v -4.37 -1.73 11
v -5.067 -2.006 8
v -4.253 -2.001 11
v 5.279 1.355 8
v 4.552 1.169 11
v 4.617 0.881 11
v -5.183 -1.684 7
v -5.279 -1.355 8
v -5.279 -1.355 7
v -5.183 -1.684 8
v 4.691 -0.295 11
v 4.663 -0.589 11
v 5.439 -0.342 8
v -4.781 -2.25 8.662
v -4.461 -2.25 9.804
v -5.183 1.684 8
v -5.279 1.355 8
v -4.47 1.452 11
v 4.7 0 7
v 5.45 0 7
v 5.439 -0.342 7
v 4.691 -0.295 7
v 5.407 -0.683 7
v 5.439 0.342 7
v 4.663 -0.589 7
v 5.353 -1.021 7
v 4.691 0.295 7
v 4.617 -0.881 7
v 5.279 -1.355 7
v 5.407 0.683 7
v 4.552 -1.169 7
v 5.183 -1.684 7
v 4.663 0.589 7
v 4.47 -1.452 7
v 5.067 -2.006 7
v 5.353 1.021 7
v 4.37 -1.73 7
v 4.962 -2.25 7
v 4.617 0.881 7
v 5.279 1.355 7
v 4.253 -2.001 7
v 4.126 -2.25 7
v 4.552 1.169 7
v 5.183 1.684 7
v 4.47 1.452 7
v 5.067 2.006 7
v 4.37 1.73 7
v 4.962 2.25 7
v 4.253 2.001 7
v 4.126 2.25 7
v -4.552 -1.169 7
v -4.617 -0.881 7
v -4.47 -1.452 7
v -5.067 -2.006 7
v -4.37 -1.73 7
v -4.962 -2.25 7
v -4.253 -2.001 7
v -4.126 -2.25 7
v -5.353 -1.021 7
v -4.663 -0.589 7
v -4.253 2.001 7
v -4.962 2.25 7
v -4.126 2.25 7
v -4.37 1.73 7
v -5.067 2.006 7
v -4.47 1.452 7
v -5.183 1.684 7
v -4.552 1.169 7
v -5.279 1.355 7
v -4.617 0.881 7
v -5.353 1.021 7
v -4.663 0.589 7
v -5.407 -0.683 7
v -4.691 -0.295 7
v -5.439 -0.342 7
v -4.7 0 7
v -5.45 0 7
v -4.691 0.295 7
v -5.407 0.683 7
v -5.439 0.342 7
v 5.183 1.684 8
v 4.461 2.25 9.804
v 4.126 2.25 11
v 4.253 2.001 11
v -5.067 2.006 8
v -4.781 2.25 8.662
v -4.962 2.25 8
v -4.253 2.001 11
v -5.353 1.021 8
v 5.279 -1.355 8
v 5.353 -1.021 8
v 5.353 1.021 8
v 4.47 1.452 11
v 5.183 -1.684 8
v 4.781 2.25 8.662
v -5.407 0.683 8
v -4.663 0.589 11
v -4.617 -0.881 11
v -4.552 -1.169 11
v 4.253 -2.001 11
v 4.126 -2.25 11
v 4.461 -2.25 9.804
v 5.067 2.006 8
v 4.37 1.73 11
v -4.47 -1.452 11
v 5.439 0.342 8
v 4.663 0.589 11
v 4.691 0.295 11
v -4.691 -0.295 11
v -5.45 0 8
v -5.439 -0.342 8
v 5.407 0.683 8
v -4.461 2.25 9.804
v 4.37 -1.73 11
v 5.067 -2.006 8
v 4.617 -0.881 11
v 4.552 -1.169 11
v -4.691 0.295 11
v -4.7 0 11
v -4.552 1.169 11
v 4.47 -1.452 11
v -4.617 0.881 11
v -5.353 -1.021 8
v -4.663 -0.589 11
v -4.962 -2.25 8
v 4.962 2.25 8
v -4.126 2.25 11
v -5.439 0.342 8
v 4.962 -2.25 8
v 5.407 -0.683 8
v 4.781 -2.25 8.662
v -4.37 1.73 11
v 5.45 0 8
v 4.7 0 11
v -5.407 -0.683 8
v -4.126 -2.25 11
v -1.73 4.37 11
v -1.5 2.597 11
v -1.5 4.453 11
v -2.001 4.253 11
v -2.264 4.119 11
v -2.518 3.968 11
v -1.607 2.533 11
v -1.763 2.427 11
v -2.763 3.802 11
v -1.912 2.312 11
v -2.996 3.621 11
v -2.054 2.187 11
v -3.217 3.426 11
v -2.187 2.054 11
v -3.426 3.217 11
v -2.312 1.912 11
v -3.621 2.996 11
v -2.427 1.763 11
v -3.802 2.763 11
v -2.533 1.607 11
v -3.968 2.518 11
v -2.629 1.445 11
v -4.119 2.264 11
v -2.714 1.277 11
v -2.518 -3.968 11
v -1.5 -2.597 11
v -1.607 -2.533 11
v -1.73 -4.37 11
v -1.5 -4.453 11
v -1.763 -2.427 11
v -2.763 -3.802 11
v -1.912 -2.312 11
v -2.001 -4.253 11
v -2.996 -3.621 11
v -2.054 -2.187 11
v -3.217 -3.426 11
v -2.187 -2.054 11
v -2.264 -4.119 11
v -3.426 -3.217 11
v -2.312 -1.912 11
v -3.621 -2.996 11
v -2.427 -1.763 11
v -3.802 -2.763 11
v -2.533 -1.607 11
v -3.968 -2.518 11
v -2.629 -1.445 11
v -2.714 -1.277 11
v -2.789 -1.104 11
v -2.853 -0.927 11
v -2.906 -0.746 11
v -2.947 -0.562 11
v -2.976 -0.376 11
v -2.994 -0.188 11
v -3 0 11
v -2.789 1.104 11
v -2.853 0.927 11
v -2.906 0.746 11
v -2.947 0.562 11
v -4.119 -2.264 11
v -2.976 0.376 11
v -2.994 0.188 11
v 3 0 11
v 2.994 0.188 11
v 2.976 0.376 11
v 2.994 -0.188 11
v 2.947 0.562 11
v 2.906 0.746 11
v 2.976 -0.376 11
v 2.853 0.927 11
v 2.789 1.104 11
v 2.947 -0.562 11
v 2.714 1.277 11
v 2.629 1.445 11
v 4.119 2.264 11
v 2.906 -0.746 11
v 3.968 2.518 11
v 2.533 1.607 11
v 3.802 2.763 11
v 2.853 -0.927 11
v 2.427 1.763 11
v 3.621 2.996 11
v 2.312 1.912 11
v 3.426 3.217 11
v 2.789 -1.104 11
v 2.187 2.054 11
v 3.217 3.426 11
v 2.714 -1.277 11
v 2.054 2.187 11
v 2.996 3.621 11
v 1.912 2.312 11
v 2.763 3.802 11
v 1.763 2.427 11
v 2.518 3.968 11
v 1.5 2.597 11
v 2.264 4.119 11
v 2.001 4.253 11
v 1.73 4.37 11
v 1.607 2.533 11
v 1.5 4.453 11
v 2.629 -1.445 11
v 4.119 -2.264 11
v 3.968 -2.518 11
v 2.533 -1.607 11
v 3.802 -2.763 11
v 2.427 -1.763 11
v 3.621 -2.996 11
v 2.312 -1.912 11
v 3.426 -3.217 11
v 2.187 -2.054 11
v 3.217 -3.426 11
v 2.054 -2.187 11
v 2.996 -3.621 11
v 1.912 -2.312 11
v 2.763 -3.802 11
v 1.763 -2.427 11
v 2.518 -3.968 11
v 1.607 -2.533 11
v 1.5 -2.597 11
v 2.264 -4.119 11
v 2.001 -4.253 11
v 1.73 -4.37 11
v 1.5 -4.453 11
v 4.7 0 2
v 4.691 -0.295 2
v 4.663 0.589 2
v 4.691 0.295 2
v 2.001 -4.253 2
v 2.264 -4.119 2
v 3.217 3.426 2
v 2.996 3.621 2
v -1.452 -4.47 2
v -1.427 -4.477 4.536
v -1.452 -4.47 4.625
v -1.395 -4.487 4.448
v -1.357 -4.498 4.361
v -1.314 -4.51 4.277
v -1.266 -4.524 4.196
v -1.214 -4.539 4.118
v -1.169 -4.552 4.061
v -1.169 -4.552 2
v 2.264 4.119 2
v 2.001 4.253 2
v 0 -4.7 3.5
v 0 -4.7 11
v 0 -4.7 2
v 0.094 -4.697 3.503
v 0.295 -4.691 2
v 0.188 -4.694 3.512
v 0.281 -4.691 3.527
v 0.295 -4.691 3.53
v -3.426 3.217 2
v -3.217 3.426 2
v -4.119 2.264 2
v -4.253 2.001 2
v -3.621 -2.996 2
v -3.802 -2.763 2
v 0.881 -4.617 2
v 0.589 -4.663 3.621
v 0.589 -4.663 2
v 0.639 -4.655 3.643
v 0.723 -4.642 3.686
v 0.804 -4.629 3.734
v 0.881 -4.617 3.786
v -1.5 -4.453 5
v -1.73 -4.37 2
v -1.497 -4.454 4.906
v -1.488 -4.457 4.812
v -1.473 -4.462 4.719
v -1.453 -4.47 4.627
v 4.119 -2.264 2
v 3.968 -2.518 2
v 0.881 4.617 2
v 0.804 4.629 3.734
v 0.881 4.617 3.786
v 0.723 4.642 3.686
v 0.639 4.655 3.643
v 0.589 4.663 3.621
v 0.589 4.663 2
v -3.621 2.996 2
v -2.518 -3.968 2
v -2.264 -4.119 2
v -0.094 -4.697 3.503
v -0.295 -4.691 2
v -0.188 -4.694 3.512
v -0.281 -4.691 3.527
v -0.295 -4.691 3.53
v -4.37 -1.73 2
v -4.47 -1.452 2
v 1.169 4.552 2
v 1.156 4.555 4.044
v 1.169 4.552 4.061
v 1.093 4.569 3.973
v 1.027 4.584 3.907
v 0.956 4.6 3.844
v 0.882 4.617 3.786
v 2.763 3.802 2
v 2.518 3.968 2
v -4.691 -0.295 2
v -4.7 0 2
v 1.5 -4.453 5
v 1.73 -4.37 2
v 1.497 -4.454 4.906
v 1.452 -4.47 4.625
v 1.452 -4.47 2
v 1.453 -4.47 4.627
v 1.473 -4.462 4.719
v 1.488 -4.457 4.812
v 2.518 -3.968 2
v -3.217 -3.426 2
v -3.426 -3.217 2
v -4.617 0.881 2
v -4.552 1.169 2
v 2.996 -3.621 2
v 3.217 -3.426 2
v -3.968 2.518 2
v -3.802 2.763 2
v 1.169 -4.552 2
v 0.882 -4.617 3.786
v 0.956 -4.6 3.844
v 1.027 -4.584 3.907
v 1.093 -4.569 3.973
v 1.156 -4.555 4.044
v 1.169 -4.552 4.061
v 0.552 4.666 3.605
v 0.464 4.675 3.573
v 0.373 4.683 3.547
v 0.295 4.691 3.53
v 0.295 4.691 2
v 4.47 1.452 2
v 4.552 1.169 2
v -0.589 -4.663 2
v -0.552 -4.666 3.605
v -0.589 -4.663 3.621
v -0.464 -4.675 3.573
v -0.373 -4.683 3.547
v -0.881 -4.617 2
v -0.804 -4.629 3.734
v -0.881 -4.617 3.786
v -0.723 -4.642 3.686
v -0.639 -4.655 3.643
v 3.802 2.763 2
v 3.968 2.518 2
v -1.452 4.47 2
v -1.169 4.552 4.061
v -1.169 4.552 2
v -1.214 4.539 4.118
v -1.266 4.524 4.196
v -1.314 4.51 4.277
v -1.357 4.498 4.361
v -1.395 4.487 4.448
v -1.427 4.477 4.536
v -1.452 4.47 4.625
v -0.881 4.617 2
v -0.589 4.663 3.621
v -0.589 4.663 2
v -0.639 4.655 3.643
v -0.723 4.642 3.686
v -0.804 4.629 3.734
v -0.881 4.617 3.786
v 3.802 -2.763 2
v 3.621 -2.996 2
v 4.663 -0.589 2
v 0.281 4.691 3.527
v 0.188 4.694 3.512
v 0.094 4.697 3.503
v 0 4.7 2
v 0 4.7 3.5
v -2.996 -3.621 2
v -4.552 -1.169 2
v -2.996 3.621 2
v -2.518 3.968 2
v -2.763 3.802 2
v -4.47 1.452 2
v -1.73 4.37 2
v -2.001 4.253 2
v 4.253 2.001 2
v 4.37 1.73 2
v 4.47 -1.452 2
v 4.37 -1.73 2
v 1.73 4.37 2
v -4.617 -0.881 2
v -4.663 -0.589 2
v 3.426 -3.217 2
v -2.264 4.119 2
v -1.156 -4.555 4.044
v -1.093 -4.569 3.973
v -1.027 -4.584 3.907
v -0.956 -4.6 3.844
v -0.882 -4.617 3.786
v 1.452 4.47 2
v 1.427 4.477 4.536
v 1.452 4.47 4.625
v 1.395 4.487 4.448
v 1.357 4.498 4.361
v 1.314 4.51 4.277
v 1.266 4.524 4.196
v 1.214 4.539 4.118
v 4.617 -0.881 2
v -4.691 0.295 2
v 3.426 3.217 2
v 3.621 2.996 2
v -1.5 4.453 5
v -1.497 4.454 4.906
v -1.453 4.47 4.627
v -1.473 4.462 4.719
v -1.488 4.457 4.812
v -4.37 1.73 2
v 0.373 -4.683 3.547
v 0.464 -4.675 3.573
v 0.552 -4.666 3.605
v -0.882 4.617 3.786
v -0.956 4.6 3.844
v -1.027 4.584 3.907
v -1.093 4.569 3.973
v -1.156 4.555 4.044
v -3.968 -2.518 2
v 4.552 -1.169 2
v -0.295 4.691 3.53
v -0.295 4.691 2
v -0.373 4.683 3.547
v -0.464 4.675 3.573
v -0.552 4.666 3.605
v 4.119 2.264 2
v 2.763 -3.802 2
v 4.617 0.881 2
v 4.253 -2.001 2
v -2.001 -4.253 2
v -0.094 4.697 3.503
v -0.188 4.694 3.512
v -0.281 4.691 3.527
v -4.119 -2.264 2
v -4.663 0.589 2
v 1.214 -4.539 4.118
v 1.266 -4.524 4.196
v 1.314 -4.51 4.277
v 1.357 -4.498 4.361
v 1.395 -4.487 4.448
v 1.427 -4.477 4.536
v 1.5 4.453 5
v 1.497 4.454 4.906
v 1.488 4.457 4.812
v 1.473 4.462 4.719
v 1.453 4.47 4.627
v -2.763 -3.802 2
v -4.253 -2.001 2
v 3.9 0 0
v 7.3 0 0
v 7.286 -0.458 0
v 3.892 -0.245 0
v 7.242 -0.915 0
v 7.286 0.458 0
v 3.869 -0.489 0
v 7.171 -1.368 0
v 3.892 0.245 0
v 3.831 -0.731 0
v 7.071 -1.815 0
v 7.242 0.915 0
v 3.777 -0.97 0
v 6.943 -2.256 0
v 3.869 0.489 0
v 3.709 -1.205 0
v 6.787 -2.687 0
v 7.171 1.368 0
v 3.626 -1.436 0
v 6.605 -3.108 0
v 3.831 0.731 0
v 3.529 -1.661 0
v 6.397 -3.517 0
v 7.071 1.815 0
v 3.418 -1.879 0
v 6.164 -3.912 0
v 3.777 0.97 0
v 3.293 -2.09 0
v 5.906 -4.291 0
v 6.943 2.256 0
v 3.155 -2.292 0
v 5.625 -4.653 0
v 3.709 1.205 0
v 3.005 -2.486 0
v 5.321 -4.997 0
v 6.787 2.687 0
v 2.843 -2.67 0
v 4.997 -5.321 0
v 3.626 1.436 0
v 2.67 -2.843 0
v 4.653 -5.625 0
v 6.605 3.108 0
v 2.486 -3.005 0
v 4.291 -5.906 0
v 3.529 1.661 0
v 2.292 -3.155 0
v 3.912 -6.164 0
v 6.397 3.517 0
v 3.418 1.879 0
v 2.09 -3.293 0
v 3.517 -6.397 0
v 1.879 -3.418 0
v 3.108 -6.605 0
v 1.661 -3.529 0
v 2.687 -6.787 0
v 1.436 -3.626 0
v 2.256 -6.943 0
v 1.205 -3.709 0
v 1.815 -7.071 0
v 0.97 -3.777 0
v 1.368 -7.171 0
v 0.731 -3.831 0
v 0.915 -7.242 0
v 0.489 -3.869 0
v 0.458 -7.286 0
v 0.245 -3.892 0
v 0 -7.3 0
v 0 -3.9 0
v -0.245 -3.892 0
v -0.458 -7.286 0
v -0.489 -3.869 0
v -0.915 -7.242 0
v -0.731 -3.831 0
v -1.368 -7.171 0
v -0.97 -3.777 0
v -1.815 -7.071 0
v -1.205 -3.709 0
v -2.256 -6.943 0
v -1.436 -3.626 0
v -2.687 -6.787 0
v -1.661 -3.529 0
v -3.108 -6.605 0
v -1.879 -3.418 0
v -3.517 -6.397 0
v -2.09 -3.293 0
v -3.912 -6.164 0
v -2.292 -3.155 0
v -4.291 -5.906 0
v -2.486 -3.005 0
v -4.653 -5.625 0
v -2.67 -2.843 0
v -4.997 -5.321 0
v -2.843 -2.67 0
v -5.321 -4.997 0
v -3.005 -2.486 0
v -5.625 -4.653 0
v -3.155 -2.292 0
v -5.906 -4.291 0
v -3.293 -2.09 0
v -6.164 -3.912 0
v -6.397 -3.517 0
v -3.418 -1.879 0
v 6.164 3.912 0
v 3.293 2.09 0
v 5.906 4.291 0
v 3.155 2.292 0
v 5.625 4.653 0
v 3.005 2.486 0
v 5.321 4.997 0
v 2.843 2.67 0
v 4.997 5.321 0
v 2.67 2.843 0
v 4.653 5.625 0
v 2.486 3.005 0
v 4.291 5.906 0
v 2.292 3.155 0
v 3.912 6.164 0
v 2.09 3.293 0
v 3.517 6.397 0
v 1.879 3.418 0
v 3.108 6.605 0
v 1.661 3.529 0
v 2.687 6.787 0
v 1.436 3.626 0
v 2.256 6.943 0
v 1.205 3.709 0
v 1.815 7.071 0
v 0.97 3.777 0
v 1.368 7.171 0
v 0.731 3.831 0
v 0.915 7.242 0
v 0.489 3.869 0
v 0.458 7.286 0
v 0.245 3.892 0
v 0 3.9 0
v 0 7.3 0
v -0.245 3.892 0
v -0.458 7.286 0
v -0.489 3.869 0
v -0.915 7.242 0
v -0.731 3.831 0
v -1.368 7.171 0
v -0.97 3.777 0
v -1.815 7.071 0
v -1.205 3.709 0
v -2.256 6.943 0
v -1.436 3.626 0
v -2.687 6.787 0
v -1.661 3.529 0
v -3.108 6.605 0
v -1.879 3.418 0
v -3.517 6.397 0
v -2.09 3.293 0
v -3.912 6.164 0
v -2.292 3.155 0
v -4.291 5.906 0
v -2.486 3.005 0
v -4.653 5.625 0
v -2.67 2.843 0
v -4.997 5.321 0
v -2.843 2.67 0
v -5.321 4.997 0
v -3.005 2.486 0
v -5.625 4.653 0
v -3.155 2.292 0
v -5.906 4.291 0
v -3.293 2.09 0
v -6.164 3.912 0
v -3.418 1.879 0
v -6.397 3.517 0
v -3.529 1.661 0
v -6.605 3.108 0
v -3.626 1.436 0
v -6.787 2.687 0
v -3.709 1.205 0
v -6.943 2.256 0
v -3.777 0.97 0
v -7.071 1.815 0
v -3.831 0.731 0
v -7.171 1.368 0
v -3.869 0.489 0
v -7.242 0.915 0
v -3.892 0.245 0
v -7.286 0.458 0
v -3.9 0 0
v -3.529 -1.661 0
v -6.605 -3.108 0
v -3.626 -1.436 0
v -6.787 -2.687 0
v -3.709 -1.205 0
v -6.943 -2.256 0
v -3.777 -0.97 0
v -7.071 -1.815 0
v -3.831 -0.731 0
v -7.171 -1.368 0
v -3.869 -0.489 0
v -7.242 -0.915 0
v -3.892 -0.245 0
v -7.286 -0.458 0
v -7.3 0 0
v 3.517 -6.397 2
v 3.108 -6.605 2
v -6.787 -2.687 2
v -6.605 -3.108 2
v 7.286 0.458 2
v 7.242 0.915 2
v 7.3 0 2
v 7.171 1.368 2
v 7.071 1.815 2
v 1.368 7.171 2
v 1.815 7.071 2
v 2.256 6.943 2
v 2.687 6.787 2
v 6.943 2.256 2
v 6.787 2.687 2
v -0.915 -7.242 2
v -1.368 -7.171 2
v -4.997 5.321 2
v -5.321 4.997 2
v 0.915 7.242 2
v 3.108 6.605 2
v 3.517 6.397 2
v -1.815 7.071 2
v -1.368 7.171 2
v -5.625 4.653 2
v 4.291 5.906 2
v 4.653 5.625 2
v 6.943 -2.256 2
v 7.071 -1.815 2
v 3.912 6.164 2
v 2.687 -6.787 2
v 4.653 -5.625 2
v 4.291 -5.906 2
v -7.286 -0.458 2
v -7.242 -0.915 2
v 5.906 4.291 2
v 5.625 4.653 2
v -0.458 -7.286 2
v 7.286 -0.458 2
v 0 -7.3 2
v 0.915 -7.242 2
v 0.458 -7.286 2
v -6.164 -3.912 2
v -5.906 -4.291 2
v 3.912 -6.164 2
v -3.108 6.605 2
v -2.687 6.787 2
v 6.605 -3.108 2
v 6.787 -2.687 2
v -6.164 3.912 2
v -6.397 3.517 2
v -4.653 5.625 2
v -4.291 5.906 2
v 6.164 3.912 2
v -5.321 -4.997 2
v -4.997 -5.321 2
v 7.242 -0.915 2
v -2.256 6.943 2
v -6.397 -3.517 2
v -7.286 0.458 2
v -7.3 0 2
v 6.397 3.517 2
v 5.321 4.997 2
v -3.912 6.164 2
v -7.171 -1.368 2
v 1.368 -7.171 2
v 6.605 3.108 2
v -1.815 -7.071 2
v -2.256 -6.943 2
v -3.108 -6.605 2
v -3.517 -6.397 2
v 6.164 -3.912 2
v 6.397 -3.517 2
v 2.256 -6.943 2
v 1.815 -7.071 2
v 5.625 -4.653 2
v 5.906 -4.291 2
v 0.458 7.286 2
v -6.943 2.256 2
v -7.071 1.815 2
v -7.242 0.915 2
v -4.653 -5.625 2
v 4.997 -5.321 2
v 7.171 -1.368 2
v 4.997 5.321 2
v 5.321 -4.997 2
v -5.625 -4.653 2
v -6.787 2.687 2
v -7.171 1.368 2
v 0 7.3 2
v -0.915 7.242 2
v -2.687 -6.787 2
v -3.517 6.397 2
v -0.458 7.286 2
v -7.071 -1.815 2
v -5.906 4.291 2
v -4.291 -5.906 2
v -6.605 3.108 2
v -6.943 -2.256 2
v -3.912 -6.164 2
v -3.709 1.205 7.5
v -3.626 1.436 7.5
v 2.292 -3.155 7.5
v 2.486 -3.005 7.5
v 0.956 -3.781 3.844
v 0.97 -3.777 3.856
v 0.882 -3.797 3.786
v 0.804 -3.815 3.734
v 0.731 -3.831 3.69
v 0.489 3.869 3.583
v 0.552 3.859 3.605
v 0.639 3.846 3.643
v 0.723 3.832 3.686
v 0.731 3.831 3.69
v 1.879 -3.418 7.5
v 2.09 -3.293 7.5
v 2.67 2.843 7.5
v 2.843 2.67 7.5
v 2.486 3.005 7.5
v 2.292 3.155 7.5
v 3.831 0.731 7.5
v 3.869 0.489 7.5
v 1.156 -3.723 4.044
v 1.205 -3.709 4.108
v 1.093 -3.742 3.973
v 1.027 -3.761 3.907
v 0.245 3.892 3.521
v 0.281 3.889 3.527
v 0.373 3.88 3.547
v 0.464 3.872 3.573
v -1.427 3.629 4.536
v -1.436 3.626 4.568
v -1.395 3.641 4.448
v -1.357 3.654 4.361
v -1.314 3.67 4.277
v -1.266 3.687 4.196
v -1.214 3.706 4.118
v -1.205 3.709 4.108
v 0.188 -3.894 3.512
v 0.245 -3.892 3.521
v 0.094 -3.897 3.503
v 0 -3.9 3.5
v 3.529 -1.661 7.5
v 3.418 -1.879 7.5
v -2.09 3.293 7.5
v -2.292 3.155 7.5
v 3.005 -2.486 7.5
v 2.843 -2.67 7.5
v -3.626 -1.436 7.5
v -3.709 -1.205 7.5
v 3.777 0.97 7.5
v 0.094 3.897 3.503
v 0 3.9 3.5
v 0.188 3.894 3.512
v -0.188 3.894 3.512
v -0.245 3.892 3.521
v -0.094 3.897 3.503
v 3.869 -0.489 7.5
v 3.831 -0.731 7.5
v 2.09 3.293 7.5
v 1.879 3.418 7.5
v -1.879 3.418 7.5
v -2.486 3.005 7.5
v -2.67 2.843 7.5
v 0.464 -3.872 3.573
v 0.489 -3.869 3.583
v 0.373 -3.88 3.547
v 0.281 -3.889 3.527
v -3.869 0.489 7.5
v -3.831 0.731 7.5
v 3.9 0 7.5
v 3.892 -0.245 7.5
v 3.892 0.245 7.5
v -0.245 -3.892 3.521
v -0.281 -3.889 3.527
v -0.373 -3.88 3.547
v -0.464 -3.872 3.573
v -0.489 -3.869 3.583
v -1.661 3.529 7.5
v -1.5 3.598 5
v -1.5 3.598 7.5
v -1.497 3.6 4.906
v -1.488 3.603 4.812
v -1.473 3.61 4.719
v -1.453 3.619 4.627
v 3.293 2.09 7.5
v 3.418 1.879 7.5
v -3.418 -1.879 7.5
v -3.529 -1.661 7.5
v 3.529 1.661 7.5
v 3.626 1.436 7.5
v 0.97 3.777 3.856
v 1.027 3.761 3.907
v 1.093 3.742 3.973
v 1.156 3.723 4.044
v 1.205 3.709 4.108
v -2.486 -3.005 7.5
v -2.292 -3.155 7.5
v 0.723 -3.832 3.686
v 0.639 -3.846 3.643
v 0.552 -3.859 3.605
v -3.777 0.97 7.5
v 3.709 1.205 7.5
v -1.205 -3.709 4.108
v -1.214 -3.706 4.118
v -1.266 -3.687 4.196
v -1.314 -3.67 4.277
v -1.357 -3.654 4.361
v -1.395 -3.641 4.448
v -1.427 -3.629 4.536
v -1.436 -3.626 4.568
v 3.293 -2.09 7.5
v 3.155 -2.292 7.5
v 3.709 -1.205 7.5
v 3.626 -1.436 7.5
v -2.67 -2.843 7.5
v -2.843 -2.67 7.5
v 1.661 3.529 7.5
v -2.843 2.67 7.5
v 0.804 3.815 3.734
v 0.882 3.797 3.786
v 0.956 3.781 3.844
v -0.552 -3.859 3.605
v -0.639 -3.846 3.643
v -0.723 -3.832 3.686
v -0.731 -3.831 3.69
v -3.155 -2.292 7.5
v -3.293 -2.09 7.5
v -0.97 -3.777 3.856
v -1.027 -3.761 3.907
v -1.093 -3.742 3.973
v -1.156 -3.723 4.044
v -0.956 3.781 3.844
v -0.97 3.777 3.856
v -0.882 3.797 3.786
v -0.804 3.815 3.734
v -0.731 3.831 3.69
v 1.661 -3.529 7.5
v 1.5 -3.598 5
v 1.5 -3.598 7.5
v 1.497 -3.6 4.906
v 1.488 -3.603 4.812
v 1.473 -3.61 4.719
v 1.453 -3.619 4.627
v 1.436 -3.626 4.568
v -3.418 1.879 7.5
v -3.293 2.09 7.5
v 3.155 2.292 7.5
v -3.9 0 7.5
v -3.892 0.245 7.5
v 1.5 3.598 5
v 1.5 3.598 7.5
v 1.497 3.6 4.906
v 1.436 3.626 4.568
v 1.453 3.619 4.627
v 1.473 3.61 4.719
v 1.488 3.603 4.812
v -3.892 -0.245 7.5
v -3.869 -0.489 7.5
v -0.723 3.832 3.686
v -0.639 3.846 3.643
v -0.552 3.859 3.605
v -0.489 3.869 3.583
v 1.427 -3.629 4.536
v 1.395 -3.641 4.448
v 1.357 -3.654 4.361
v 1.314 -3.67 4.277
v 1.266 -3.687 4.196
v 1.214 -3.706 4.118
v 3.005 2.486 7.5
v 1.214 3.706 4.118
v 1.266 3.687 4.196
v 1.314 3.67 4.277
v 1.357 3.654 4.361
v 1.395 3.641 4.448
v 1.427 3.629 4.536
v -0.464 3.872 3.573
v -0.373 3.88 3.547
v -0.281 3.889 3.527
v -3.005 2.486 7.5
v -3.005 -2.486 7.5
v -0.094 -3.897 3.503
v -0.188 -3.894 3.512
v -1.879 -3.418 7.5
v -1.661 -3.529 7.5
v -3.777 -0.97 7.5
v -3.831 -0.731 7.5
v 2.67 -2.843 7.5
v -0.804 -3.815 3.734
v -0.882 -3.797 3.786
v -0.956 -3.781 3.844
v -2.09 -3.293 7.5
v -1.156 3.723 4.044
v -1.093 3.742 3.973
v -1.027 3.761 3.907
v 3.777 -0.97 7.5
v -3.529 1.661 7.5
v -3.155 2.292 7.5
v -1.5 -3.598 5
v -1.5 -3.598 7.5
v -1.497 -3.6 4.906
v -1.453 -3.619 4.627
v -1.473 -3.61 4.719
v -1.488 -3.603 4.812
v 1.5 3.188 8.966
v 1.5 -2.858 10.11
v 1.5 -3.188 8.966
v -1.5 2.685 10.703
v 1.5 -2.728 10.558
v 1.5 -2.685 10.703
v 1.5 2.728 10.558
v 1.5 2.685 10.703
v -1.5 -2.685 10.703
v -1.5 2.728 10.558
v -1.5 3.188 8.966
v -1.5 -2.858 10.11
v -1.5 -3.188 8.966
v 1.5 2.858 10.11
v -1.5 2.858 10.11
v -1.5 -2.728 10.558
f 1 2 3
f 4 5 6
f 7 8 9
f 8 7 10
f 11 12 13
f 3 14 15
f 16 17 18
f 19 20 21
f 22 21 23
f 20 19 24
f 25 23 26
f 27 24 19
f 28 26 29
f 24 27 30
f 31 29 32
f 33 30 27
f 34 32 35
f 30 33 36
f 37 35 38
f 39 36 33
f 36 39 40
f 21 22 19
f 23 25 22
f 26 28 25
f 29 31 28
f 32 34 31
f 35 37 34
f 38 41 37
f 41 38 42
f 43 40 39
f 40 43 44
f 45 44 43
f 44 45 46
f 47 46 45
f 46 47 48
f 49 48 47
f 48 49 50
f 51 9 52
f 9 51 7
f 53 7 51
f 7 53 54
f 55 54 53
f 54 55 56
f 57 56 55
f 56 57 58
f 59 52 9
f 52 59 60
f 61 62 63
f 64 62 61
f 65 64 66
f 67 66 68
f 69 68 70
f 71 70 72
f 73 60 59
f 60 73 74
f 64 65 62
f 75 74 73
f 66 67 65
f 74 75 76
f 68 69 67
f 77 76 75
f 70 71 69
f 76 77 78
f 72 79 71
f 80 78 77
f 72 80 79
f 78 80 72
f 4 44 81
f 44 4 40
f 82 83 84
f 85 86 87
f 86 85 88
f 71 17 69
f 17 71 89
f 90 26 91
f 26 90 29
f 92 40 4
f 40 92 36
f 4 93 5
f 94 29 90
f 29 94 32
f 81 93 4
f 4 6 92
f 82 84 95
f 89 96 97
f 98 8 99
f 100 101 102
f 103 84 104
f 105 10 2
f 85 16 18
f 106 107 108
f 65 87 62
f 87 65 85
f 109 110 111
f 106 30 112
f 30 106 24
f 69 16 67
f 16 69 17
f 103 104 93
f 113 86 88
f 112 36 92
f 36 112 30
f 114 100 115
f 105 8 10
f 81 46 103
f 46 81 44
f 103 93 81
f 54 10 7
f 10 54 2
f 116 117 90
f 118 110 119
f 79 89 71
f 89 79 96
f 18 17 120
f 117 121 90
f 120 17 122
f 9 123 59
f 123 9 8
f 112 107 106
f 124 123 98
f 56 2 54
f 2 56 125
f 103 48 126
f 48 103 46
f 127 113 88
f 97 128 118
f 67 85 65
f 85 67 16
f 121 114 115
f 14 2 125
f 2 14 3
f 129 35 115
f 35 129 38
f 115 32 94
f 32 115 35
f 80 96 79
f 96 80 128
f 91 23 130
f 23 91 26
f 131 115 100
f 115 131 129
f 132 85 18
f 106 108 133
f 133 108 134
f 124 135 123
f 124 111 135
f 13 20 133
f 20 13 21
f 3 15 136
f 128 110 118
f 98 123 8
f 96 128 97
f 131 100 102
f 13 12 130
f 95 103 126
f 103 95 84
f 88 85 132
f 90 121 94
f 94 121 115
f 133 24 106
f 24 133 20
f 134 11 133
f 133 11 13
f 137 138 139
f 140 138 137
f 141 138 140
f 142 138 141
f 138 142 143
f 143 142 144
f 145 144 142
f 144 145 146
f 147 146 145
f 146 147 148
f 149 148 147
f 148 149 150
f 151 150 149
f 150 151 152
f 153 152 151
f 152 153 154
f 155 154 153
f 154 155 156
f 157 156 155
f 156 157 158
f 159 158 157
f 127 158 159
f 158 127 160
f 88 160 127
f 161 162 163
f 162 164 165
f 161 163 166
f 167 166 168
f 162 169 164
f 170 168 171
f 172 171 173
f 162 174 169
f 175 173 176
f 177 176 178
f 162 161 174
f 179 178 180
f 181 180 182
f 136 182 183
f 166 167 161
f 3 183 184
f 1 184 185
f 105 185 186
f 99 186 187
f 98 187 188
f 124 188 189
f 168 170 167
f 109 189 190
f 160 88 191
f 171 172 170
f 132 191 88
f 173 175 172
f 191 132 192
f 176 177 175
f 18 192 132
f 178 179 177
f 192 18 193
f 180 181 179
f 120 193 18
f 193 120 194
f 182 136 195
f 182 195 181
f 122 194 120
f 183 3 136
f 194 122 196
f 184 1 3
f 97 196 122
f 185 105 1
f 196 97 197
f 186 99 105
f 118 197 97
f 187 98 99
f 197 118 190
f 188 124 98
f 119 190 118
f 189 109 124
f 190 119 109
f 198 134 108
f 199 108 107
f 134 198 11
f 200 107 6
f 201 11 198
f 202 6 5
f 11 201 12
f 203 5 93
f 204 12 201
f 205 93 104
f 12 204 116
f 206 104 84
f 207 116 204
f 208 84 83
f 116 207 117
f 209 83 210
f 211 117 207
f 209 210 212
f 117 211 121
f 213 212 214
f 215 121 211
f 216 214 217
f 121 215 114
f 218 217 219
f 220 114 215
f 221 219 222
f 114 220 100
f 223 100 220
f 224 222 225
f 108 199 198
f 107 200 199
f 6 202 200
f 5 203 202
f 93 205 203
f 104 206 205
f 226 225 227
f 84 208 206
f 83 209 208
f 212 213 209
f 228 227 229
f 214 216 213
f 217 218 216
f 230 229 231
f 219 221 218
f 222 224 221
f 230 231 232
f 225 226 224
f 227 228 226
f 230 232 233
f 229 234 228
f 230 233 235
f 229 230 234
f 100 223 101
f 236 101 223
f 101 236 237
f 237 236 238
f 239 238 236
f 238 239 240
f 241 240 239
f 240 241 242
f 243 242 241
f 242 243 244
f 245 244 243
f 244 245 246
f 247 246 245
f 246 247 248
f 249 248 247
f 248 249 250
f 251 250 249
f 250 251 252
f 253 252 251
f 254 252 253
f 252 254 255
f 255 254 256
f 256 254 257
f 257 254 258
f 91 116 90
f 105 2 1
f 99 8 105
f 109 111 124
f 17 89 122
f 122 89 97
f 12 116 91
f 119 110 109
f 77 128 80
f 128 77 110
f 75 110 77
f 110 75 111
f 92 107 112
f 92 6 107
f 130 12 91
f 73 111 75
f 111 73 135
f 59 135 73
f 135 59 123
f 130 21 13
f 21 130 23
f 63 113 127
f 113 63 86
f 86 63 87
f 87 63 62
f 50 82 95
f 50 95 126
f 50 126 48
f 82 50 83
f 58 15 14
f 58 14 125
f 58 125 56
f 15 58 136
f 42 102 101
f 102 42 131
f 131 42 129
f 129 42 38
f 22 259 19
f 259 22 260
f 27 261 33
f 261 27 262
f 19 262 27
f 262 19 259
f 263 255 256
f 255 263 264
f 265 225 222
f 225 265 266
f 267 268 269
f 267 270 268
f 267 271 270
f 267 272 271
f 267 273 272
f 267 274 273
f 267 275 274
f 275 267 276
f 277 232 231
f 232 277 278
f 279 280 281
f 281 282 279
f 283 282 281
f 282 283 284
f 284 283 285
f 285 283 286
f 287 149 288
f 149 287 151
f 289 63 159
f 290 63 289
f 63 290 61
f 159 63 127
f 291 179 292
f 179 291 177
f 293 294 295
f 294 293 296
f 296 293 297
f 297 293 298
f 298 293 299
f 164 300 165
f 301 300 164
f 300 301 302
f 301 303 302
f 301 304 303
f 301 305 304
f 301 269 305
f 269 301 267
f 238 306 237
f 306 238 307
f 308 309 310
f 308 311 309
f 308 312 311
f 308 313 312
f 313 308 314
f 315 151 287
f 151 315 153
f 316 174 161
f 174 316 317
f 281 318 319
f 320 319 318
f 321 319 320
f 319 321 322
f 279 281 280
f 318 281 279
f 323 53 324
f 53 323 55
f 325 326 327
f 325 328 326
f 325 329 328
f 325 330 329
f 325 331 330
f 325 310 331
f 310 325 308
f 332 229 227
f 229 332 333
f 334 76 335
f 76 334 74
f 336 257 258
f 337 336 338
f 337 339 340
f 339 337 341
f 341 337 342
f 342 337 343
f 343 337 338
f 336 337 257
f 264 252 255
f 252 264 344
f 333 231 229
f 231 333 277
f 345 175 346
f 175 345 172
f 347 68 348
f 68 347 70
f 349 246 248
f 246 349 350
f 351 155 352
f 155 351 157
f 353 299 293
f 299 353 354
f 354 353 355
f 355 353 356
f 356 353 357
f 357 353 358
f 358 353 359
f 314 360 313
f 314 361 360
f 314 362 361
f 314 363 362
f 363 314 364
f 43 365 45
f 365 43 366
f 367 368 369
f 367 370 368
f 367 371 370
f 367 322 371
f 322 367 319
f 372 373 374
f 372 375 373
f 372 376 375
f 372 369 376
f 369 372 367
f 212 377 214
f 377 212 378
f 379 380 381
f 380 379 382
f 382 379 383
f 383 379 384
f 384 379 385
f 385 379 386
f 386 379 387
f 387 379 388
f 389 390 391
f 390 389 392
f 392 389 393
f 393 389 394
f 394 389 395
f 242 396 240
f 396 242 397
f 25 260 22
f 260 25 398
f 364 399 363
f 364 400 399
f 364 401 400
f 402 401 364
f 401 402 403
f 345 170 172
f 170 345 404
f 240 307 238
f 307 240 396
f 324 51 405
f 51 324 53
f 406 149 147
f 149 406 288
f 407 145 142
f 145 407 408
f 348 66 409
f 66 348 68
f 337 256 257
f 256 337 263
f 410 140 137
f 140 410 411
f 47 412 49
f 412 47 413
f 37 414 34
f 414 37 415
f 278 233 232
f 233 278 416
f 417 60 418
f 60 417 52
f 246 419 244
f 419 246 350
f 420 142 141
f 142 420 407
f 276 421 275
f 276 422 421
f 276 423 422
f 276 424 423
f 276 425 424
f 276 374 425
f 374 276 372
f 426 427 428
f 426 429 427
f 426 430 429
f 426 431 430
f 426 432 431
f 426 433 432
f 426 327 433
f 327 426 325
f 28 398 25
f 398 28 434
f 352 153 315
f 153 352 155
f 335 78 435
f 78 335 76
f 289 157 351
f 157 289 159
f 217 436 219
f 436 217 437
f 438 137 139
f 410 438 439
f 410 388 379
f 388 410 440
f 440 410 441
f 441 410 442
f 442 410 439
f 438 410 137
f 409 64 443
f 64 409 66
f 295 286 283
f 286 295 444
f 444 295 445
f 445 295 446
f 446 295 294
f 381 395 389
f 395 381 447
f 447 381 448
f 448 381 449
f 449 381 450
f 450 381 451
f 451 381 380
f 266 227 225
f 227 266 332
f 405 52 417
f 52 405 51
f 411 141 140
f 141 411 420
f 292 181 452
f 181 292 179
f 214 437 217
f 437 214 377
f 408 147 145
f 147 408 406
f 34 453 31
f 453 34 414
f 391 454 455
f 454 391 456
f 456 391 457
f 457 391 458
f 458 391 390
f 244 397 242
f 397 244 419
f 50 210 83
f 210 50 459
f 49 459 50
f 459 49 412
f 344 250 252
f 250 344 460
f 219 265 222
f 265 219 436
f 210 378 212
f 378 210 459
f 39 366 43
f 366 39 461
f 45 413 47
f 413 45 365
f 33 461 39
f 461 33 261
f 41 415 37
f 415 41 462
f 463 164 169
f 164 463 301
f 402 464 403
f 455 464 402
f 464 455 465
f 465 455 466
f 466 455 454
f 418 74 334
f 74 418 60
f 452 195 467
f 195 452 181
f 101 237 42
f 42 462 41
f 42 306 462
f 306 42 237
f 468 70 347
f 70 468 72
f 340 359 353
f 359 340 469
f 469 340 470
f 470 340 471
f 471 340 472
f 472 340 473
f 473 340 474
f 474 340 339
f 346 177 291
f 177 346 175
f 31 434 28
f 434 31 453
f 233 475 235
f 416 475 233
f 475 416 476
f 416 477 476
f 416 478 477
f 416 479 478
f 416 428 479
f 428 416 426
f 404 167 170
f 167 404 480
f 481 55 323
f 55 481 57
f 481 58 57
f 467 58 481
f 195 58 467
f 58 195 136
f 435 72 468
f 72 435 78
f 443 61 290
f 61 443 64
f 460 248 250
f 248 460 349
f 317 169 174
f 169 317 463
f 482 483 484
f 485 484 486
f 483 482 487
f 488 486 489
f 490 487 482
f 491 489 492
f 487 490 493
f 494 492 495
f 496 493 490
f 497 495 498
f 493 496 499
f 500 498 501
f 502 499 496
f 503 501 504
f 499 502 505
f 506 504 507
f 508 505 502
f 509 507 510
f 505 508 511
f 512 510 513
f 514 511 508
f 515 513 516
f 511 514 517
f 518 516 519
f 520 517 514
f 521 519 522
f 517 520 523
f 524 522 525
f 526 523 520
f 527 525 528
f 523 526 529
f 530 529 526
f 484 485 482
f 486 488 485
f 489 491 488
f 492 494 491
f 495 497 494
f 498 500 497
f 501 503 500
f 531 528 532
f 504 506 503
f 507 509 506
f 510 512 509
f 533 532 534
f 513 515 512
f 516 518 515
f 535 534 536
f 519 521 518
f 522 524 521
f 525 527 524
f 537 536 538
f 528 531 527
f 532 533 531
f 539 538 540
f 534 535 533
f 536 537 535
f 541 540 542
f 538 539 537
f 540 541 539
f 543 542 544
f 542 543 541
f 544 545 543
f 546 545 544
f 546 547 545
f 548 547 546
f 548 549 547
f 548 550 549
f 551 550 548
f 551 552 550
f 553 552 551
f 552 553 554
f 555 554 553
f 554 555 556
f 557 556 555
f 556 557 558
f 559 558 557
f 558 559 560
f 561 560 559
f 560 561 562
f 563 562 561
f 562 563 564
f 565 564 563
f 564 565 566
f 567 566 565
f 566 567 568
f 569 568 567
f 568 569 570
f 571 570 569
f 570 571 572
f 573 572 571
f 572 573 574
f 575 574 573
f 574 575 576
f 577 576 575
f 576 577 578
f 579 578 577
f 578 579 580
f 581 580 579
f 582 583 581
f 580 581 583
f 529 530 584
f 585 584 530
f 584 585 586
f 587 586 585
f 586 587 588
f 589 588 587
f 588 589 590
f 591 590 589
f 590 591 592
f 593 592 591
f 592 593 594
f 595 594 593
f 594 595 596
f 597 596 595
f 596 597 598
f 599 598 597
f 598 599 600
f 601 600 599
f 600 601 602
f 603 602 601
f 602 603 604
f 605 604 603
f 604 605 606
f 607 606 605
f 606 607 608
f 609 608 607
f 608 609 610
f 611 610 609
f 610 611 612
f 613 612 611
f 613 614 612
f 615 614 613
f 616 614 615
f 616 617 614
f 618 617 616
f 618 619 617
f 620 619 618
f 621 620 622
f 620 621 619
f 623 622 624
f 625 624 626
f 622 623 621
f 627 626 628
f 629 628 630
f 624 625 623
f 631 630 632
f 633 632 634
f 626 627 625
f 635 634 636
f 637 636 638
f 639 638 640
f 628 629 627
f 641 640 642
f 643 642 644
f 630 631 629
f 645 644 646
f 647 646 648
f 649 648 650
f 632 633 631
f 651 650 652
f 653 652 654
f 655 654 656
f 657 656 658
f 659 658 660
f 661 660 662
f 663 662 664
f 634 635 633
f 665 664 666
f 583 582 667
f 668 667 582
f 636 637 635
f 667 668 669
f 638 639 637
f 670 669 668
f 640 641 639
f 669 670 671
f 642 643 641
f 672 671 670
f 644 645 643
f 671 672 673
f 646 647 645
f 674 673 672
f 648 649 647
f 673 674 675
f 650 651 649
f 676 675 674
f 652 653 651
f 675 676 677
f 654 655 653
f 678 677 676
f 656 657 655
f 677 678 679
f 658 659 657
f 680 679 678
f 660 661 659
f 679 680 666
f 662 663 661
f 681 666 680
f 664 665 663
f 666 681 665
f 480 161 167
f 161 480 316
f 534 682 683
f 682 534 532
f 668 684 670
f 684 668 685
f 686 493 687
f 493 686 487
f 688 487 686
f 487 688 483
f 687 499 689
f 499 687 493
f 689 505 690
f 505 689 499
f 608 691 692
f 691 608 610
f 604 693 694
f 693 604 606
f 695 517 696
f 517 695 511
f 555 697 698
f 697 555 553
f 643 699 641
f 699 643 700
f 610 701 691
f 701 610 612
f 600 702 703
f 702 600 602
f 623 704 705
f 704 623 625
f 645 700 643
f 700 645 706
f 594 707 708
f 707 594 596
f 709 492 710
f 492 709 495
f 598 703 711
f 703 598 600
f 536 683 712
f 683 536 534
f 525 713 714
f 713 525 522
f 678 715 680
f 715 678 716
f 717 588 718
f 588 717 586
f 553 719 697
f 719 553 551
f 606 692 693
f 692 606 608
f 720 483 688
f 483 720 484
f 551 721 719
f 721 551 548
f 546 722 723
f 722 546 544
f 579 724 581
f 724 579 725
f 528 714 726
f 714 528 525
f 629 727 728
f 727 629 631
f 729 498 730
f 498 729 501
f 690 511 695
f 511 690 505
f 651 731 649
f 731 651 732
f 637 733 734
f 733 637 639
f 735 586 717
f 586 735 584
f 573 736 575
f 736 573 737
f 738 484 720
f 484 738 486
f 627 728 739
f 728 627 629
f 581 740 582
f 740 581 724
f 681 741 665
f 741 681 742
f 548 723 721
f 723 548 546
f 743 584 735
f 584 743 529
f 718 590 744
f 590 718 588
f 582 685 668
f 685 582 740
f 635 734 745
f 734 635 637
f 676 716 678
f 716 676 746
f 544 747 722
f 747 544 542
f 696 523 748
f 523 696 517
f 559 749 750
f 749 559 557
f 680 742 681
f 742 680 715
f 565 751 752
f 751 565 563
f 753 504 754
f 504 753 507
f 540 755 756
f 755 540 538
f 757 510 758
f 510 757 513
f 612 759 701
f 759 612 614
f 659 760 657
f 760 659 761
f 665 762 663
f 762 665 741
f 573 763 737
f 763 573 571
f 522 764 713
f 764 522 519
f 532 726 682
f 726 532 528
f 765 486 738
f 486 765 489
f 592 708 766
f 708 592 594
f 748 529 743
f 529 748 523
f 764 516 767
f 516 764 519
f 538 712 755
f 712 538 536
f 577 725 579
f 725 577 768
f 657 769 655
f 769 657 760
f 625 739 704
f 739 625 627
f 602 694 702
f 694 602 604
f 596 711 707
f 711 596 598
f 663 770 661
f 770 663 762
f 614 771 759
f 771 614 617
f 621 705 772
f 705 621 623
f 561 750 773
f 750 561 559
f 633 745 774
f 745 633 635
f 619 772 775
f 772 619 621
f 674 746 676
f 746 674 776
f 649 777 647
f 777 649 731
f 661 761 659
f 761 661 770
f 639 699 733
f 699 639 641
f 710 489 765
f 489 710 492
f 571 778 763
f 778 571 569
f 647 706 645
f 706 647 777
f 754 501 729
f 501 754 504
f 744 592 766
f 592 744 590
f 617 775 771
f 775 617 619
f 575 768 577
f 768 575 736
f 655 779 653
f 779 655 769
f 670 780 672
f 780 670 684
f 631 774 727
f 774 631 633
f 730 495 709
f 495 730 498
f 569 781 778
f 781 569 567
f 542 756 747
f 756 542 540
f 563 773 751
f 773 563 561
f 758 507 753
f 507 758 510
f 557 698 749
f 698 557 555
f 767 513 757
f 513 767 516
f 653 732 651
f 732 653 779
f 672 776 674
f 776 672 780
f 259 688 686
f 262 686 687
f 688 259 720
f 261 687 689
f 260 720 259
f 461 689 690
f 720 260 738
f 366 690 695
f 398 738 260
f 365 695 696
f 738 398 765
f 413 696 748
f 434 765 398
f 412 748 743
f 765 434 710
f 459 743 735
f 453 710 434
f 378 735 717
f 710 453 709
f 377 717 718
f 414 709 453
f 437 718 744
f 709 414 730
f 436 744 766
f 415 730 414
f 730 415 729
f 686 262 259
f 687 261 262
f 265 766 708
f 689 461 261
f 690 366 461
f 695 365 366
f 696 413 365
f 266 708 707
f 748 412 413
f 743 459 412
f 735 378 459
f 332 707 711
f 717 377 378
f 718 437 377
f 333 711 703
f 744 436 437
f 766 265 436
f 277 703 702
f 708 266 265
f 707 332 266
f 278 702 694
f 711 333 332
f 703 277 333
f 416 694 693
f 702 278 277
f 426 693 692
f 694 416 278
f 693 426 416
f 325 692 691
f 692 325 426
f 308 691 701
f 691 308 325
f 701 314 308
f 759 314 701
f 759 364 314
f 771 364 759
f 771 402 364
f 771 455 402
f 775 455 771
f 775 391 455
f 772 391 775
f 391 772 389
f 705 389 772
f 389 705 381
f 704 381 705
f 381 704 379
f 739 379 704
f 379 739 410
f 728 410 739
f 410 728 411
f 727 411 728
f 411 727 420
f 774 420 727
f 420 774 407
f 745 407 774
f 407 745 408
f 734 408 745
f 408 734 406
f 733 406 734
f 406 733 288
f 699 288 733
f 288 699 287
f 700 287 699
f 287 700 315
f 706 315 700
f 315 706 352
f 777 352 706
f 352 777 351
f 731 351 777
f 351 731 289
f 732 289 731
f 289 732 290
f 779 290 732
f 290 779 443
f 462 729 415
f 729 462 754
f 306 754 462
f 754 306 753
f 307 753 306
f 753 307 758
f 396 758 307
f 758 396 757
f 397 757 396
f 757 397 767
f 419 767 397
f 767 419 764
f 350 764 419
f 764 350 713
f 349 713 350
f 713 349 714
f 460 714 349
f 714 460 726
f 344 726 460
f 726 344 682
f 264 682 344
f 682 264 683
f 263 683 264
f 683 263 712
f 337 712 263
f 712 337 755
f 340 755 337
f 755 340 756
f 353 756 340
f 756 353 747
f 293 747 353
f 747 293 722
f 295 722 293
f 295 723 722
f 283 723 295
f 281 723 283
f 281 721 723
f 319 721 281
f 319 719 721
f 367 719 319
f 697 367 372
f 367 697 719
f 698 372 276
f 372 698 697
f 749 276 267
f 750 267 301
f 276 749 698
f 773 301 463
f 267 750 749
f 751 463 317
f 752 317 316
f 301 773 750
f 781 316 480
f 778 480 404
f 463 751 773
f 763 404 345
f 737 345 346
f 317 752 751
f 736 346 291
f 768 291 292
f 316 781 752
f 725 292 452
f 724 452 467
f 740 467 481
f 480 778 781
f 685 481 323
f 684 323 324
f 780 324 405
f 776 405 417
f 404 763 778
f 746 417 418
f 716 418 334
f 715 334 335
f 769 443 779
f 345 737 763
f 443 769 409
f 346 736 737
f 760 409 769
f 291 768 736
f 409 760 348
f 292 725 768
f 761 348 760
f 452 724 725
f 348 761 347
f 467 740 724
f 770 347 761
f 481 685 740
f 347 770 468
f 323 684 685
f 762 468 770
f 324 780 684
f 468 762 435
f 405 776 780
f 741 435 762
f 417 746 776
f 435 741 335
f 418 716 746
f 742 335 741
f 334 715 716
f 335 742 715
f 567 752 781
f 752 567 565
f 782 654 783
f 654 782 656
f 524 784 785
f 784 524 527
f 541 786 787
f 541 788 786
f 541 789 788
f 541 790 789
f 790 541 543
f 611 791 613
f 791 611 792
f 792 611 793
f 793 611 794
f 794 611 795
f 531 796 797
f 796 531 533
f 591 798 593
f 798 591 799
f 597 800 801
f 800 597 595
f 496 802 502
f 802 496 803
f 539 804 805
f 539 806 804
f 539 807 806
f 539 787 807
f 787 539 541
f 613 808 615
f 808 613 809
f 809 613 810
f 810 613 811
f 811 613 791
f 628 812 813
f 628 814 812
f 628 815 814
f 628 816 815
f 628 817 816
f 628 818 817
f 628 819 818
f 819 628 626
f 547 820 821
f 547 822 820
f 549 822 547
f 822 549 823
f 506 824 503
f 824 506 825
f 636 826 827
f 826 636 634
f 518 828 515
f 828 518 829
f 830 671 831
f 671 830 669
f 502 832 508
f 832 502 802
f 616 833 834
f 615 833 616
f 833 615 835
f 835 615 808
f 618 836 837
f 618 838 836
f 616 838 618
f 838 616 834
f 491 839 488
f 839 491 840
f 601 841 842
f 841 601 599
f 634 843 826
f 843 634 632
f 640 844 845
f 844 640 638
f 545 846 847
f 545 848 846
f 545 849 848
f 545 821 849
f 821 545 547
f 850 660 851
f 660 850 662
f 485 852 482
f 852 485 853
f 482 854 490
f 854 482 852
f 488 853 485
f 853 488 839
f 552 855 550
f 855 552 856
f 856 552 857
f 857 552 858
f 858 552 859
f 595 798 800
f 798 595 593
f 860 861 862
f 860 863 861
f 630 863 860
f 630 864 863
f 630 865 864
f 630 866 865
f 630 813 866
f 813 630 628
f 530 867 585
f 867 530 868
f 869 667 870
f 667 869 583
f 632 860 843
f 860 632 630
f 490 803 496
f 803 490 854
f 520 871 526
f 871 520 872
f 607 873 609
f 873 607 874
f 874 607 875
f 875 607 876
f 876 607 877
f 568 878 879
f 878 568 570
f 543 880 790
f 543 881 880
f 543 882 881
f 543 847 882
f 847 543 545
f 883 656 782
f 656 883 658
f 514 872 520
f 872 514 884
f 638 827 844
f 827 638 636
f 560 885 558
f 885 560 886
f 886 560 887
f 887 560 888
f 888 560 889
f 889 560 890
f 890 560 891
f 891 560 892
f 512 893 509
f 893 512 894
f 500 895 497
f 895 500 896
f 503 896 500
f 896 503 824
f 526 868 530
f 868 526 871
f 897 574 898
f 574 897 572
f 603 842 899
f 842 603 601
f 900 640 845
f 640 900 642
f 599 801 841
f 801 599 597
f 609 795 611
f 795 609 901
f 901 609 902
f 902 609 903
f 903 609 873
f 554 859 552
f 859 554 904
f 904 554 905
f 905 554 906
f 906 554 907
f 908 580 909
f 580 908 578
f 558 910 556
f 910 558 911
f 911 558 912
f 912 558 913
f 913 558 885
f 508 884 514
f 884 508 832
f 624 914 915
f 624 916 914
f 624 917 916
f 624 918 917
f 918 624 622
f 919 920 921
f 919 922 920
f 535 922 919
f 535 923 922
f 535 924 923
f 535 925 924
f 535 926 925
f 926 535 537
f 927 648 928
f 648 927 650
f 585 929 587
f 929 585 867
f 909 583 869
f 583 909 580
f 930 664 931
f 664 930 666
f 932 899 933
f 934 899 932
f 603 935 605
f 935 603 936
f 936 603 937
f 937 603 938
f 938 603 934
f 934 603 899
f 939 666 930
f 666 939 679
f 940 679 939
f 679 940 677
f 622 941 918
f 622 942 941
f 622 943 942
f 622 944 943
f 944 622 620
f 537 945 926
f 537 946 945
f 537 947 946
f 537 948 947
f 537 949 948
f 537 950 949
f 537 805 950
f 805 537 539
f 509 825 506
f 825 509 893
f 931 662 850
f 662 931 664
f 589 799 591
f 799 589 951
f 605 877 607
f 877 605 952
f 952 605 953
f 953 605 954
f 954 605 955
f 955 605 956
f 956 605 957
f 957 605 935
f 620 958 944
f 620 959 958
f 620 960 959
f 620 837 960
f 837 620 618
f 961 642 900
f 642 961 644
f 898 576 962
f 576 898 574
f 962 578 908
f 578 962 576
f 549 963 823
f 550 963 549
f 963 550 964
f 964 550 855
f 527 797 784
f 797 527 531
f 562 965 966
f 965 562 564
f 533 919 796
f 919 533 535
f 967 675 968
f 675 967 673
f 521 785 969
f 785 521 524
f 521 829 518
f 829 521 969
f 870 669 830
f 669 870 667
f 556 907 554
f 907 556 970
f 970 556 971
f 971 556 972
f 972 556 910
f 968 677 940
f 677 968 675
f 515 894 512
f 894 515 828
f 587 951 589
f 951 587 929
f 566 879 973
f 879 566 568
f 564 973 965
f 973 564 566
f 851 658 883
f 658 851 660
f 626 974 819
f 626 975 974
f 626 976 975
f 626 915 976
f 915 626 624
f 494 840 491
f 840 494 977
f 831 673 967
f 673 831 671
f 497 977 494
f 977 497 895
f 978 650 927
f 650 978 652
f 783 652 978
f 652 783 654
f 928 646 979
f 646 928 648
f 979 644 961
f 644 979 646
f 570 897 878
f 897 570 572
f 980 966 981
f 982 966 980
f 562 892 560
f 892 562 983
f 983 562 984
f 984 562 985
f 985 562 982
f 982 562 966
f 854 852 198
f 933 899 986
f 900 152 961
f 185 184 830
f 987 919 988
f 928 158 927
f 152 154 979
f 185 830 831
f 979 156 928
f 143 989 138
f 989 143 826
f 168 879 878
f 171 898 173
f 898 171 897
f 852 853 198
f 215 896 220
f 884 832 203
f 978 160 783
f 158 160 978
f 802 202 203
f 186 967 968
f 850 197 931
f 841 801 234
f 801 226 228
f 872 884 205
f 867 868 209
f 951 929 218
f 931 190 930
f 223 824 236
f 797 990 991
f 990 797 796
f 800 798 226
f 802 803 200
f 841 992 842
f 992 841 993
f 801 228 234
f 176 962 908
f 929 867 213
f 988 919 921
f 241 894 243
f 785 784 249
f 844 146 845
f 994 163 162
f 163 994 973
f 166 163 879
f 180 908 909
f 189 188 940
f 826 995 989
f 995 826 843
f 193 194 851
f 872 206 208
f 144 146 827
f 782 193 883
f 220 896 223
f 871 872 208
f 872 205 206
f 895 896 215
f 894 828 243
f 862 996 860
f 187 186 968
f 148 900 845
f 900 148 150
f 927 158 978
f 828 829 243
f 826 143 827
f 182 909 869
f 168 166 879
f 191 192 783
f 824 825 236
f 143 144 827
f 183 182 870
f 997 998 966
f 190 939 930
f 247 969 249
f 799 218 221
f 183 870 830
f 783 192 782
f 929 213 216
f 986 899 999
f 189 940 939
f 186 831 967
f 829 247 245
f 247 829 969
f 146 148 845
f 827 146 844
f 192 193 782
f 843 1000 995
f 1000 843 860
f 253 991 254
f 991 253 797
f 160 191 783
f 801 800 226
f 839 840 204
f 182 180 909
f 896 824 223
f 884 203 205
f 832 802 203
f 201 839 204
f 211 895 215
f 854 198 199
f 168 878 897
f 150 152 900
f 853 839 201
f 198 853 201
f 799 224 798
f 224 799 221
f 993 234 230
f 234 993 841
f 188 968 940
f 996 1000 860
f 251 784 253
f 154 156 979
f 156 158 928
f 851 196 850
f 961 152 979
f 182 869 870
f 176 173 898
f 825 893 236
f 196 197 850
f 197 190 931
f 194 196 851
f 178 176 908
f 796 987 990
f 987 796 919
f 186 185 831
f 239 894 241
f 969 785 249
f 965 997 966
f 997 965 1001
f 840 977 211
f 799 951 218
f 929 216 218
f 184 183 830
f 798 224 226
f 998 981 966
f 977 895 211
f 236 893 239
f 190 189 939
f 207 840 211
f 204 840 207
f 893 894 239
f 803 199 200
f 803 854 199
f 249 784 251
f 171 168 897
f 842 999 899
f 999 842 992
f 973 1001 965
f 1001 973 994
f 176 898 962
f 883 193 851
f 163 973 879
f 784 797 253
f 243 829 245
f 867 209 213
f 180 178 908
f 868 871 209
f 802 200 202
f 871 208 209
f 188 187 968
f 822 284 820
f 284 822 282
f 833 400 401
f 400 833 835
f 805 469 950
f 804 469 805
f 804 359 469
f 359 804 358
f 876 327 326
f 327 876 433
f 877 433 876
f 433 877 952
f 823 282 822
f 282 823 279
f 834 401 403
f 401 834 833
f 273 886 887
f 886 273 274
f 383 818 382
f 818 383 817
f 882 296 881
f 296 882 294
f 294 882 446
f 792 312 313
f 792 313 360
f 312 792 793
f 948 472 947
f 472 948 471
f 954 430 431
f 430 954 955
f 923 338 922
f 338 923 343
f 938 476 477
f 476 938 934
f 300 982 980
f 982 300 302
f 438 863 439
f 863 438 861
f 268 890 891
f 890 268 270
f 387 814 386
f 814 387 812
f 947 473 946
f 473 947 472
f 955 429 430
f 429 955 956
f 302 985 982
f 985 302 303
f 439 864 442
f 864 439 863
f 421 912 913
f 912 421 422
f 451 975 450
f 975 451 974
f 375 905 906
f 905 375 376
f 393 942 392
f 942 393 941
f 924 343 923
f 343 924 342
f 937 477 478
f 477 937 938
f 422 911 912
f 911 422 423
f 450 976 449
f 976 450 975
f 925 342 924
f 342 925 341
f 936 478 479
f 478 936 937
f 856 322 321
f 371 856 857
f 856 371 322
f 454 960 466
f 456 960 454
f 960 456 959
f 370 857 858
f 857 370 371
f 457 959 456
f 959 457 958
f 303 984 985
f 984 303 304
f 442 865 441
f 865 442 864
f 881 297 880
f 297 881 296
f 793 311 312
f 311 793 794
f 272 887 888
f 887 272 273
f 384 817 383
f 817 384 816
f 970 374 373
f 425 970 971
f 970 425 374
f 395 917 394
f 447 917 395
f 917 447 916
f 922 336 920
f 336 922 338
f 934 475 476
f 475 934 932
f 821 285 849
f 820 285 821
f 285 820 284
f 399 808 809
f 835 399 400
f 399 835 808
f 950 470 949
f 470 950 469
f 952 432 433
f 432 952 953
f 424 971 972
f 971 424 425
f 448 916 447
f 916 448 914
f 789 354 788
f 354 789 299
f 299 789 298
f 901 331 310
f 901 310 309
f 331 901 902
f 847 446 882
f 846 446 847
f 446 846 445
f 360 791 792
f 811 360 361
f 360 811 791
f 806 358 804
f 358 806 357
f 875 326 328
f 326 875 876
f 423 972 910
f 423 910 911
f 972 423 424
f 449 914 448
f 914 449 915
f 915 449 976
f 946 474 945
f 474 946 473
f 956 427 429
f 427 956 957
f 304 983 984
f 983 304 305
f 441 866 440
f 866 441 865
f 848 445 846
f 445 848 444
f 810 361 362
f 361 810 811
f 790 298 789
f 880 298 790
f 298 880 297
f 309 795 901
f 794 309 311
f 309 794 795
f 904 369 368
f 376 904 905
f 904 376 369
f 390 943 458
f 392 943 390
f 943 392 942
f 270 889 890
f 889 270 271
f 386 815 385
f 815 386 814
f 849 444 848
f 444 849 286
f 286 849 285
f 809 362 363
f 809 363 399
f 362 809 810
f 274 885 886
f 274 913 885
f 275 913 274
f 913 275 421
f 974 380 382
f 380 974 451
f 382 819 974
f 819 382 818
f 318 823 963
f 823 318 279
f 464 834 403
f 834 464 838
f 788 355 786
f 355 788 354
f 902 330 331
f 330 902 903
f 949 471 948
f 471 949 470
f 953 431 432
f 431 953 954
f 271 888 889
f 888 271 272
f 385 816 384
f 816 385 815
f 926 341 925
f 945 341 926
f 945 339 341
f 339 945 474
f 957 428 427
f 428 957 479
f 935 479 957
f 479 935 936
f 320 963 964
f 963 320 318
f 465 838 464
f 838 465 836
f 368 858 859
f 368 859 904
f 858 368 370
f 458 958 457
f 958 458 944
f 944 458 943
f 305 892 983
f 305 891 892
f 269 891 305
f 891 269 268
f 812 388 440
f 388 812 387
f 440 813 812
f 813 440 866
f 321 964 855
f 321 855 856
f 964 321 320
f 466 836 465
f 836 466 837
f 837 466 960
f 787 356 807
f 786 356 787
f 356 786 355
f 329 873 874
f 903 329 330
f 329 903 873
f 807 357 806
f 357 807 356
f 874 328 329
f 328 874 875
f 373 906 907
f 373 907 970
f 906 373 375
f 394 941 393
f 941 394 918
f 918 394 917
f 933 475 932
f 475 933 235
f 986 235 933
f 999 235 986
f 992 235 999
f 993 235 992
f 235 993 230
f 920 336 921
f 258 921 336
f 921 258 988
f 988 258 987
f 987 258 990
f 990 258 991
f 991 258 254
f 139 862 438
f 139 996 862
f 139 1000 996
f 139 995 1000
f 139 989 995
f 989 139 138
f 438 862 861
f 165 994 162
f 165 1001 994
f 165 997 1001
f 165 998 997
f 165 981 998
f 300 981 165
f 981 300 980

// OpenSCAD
// [FL_INDEX: keywords="openscad, 3d_parametric, Joint_rotule, csg_solid" | COT="Parametric OpenSCAD design from 3DCodeverse"]
// Title: Joint rotule

// Dimensions en mm
hauteur_piece = 11;
diametre_socle = 14.6;
epaisseur_socle = 2;
diametre_trou = 7.8;
diametre_trou_sommet = 6;
hauteur_cone = 3.5;
diametre_cylindre = 9.4;
hauteur_encoche = 7.5;
largeur_encoche = 3;
hauteur_clip = 4;
largeur_clip = 4.5;
epaisseur_clip = .75;

$fn=100; //resolution

module clip(){
intersection(){
translate(v=[0,0,hauteur_piece-hauteur_clip]){
hull(){
linear_extrude(height=1){circle(diametre_cylindre/2+epaisseur_clip);}
linear_extrude(height=hauteur_clip){circle(diametre_cylindre/2);}
}
}

translate(v=[0,0,hauteur_piece-hauteur_clip/2]){
cube([diametre_socle,largeur_clip,hauteur_clip], center=true);
}
}
}


module socle(){cylinder(h=epaisseur_socle,r=diametre_socle/2);}

module cylindre_exterieur(){
	cylinder(h=hauteur_piece,r=diametre_cylindre/2);
}

module cylindre_interieur(){
	cylinder(h=hauteur_piece-hauteur_cone,r=diametre_trou/2);
}

module cone_interieur(){
	translate(v=[0,0,hauteur_piece-hauteur_cone]){
		cylinder(h=hauteur_cone,r1=diametre_trou/2,r2=diametre_trou_sommet/2);
	}
}

module creu_interieur(){
	union(){
		cylindre_interieur();
		cone_interieur();
	}
}

module flex(){
	translate(v=[0,diametre_cylindre/2,hauteur_piece-hauteur_encoche+largeur_encoche/2]){
		rotate(a=90, v=[1,0,0]) {
			cylinder(h=diametre_cylindre,r=largeur_encoche/2);
			translate(v=[-largeur_encoche/2,0,0]){
				cube(size = [largeur_encoche,hauteur_encoche-largeur_encoche/2,diametre_cylindre], center=false);
			}
		}
	}
}

module base(){
	difference(){
		union(){
			cylindre_exterieur();
			socle();
			clip();
		}
		creu_interieur();
		flex();
	}
}

base();
